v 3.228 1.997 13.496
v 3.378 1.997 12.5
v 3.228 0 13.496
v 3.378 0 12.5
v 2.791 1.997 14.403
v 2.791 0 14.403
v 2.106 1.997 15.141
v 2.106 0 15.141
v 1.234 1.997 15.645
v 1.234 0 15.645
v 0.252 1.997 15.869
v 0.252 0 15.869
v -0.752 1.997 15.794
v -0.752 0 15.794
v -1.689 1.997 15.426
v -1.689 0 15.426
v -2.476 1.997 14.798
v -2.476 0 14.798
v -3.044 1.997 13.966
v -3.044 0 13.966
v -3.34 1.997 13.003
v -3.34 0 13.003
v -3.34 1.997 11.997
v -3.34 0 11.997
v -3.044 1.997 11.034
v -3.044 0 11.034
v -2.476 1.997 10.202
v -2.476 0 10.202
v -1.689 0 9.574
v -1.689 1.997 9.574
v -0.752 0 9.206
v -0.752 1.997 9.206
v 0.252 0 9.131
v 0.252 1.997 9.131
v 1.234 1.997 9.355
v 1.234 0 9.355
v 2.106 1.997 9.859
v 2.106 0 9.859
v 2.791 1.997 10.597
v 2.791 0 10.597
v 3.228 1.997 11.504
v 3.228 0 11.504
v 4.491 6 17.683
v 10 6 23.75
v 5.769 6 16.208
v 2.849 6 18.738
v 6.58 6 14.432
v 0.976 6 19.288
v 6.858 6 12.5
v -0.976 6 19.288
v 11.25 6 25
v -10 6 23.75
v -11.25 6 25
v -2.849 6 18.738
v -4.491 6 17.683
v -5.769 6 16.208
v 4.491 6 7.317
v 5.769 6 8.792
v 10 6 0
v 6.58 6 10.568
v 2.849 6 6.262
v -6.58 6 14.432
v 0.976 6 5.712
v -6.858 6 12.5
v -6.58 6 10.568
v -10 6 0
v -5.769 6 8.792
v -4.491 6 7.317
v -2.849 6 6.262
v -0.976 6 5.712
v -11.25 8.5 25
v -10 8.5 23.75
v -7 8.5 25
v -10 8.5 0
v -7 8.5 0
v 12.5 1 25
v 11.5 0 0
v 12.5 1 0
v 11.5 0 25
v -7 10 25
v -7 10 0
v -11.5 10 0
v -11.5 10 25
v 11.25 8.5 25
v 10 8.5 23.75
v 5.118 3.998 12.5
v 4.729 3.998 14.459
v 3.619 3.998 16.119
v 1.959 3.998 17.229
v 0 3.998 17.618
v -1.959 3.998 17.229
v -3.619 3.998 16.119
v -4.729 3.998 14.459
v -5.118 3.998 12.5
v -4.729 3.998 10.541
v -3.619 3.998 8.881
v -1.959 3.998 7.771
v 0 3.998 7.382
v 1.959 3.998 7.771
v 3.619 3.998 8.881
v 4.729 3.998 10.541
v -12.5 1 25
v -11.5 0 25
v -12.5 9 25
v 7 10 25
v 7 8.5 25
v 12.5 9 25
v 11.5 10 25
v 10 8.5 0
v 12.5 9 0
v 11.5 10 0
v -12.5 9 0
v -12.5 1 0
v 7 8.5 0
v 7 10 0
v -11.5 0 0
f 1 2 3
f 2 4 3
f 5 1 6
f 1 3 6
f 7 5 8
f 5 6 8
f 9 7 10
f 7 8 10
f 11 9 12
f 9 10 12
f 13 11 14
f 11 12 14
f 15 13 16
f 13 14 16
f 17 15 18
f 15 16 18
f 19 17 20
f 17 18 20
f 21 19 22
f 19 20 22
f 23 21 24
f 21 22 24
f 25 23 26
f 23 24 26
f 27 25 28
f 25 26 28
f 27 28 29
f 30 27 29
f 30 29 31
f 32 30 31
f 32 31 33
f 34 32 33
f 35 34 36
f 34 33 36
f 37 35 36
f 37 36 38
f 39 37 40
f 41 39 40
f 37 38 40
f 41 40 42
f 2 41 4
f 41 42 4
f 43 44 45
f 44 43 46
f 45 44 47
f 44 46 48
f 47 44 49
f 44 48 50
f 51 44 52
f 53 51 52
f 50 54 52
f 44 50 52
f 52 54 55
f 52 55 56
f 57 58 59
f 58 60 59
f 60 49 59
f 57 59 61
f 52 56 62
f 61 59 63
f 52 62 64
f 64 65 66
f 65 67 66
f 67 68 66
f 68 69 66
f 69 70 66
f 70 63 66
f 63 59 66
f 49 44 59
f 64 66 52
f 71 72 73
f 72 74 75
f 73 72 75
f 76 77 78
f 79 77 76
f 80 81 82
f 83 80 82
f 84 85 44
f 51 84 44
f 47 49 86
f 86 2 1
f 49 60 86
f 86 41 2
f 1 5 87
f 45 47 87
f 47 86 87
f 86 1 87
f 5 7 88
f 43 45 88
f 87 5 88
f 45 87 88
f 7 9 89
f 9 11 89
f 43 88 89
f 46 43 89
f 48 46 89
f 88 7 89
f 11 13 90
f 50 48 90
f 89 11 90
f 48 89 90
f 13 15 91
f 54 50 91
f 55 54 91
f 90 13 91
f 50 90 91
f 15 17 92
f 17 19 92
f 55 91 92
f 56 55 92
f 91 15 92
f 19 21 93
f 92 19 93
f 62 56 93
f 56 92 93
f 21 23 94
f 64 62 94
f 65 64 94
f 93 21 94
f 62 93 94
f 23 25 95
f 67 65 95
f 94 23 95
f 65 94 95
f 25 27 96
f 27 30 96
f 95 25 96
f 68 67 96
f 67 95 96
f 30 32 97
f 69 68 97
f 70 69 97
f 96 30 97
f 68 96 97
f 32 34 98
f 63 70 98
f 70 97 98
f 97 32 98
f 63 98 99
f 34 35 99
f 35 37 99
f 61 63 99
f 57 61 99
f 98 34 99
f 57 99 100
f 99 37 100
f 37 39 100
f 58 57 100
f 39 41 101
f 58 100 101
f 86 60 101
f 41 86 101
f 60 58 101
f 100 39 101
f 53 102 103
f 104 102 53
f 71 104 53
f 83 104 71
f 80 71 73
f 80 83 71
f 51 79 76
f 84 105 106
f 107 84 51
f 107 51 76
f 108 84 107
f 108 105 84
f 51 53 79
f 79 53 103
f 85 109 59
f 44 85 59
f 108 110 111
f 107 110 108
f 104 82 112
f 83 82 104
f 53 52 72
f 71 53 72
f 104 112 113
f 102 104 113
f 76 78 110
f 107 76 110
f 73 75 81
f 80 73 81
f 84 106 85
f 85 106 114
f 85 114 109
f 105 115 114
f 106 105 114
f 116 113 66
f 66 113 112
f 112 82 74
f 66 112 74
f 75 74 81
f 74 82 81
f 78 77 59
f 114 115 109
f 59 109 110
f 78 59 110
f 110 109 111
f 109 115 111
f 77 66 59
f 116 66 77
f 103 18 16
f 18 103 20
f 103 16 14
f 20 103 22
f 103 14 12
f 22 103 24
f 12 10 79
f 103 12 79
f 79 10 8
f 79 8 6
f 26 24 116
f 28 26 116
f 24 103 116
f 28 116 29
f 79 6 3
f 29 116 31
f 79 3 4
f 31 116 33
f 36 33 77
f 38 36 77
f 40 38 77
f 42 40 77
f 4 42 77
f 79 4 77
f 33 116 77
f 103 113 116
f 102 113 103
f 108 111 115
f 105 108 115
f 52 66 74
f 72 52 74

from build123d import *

# Parameters (mm, degrees)
F1_DEPTH       = 25
F3_D           = 6.7564
F3_CSINK_D     = 13.716
F3_CSINK_ANGLE = 82
F4_SIZE        = 1.25
F5_SIZE        = 1


with BuildPart() as f1:
    # F0 (on Top) → F1 (new body)
    with BuildSketch(Plane.XY):
        Polygon((-12.5, 10), (-12.5, 0), (12.5, 0), (12.5, 10), (7, 10), (7, 8.5), (10, 8.5), (10, 6), (-10, 6), (-10, 8.5), (-7, 8.5), (-7, 10), align=None)
    extrude(amount=F1_DEPTH)

    # F3 (through all)
    with Locations(Plane(origin=(0, 6, 0), x_dir=(-1, 0, 0), z_dir=(0, 1, 0))):
        with Locations((0, 12.5)):
            CounterSinkHole(F3_D / 2, F3_CSINK_D / 2, counter_sink_angle=F3_CSINK_ANGLE)

    # F4
    f4_edges = [f1.edges().sort_by_distance(p)[0] for p in [
        (-10, 7.25, 25),
        (10, 7.25, 25),
    ]]
    chamfer(f4_edges, length=F4_SIZE)

    # F5
    f5_edges = [f1.edges().sort_by_distance(p)[0] for p in [
        (12.5, 10, 12.5),
        (12.5, 0, 12.5),
        (-12.5, 10, 12.5),
        (-12.5, 0, 12.5),
    ]]
    chamfer(f5_edges, length=F5_SIZE)


solid = f1.part
